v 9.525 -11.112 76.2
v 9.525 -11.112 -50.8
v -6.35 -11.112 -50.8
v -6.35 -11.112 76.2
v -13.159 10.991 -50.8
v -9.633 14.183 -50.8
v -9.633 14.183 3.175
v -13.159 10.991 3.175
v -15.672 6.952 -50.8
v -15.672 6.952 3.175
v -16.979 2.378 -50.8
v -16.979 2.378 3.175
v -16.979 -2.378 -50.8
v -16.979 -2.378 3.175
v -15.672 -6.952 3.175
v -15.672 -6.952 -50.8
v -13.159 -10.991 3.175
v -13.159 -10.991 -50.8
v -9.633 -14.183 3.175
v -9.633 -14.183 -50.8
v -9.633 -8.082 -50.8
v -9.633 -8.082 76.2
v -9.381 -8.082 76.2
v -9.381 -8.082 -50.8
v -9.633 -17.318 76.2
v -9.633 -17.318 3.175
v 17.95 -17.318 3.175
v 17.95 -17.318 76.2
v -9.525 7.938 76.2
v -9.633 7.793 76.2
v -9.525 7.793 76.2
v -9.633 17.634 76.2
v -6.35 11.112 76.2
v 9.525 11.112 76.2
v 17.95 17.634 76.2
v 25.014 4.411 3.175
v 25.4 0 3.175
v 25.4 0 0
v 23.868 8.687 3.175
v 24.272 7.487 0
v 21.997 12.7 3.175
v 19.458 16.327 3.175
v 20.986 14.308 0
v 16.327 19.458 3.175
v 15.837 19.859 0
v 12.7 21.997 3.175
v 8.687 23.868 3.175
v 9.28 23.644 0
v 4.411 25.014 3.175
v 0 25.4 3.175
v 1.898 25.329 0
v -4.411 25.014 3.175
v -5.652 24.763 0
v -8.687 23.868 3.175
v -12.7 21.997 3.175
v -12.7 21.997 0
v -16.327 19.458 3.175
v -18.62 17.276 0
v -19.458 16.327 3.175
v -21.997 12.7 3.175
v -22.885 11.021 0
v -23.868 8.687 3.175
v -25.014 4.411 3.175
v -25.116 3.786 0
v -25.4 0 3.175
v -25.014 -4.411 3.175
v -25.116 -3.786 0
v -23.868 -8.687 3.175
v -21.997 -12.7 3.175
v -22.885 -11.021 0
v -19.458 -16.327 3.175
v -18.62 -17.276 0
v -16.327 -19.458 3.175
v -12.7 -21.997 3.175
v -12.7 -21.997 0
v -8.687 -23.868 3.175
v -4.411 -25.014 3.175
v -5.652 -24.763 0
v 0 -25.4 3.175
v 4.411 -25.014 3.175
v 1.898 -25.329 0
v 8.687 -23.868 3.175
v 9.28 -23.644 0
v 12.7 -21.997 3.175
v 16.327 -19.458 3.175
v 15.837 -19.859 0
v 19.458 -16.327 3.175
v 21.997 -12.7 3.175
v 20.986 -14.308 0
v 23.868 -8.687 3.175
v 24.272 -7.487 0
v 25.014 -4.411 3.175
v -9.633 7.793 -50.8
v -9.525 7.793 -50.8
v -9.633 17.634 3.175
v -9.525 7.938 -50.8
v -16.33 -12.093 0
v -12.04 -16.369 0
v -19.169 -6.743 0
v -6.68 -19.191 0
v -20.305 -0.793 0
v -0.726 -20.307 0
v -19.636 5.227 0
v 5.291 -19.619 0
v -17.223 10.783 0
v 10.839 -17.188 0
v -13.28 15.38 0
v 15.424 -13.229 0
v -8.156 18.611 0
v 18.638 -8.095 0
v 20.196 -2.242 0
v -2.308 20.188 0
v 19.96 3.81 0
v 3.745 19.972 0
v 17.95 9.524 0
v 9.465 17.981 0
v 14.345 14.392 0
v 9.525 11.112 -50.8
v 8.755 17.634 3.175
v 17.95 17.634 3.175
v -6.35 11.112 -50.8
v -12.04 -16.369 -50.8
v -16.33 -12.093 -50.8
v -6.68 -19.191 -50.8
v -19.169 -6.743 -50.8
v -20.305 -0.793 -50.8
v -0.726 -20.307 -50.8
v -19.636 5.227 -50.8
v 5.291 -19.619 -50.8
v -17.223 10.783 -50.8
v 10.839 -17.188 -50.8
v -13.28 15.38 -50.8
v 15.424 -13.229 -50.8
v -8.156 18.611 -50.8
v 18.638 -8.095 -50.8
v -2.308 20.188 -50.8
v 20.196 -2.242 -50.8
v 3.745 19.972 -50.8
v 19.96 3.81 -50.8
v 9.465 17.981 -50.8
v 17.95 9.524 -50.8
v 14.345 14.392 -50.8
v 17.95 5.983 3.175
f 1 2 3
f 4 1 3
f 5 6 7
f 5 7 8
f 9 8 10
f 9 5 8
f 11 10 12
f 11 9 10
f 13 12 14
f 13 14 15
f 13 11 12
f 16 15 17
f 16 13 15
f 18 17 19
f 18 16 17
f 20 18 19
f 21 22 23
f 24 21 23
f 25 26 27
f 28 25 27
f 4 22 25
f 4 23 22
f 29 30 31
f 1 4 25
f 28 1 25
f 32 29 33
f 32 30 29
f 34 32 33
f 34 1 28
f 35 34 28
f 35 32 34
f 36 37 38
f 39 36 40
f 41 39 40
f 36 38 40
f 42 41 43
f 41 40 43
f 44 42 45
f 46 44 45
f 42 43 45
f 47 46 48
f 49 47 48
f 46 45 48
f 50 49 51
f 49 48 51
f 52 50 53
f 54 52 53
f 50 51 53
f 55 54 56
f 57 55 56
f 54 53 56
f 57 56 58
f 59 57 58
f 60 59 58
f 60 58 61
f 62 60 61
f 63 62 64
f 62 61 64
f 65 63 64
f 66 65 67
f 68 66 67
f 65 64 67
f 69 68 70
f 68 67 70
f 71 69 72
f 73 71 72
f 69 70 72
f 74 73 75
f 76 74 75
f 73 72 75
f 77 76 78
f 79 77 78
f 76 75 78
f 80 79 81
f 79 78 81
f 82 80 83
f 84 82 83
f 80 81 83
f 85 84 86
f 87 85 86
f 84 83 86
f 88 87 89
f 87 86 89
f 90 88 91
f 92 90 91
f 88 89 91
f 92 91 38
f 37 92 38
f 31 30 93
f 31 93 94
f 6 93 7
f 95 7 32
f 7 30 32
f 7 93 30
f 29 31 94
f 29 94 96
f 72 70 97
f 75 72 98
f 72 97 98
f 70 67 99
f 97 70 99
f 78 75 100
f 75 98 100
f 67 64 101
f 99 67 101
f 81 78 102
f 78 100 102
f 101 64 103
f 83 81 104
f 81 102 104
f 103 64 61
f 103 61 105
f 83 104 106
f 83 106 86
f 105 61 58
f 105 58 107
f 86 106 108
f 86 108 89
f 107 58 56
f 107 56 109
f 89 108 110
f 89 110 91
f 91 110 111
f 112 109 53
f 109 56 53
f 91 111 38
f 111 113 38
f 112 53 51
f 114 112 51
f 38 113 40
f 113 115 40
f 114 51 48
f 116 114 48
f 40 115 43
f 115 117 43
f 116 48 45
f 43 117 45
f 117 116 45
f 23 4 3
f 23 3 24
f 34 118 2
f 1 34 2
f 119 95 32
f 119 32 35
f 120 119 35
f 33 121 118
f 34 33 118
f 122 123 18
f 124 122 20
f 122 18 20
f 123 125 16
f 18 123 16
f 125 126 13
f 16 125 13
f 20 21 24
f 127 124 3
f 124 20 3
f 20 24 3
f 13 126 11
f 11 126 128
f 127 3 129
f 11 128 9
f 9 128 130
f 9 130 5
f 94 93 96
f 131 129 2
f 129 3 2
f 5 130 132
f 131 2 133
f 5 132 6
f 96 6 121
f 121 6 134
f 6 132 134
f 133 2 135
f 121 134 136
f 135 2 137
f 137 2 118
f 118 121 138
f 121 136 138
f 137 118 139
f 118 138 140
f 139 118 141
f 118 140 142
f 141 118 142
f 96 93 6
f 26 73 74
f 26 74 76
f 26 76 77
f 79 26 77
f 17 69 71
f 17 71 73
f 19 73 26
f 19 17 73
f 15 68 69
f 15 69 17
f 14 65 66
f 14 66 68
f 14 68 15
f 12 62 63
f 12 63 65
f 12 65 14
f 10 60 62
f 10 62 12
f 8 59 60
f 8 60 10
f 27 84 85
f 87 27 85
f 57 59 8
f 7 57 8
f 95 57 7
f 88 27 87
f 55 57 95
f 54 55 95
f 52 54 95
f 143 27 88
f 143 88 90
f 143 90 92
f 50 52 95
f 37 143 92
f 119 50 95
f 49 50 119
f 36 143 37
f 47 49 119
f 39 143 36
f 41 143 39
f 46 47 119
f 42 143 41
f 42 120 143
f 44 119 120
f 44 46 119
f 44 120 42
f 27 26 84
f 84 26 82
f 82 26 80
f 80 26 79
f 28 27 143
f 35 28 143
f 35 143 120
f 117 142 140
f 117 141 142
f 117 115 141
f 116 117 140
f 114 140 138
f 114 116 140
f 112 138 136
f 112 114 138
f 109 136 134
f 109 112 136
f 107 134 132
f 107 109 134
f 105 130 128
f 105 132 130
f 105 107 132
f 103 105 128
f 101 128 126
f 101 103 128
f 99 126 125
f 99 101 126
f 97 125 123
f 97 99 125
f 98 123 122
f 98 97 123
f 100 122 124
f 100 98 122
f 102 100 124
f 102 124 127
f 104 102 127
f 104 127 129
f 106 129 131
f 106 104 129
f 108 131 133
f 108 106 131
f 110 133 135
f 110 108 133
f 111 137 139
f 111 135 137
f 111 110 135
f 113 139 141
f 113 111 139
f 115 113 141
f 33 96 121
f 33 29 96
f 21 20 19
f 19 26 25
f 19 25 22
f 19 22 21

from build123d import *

# Parameters (mm, degrees)
F0_R          = 20.32
F0_R_2        = 17.145
F2_DEPTH      = 50.8
F1_R          = 25.4
F1_R_2        = 17.145
F3_DEPTH      = 3.175
F4_W          = 27.5823939592
F4_H          = 34.9517390132
F5_DEPTH      = 76.2
F5_DEPTH_BACK = 50.8
F6_R          = 34.0814213396
F6_R_2        = 20.32
F7_DEPTH      = 76.2
F8_W          = 9.0154311216
F8_H          = 15.875
F9_DEPTH      = 76.2
F9_DEPTH_BACK = 76.2


with BuildPart() as f2:
    # F0 (on Top) → F2 (new body)
    with BuildSketch(Plane.XY):
        Circle(F0_R)
        Circle(F0_R_2, mode=Mode.SUBTRACT)
    extrude(amount=-F2_DEPTH)

    # F1 (on Top) → F3 (join)
    with BuildSketch(Plane.XY):
        Circle(F1_R)
        Circle(F1_R_2, mode=Mode.SUBTRACT)
    extrude(amount=F3_DEPTH)

    # F4 (on Top) → F5 (join, two sides)
    with BuildSketch(Plane.XY) as f5_sk:
        with Locations((4.1584149003, 0.1579150558)):
            Rectangle(F4_W, F4_H)
        Polygon((9.525, 11.1125), (9.525, -11.1125), (-6.35, -11.1125), (-9.525, -11.1125), (-9.525, -7.9375), (-9.525, 7.9375), (-9.525, 11.1125), (-6.35, 11.1125), align=None, mode=Mode.SUBTRACT)
        Polygon((-9.525, -11.1125), (-6.35, -11.1125), (-9.525, -7.9375), align=None)
        Polygon((-9.525, 7.9375), (-6.35, 11.1125), (-9.525, 11.1125), align=None)
    extrude(amount=F5_DEPTH)
    extrude(f5_sk.sketch, amount=-F5_DEPTH_BACK)

    # F6 (on Top) → F7 (cut)
    with BuildSketch(Plane.XY):
        Circle(F6_R)
        Circle(F6_R_2, mode=Mode.SUBTRACT)
    extrude(amount=-F7_DEPTH, mode=Mode.SUBTRACT)

    # F8 (on Top) → F9 (cut, two sides)
    with BuildSketch(Plane.XY) as f9_sk:
        with Locations((-7.6543868054, -0.1444227528)):
            Rectangle(F8_W, F8_H)
    extrude(amount=-F9_DEPTH, mode=Mode.SUBTRACT)
    extrude(f9_sk.sketch, amount=F9_DEPTH_BACK, mode=Mode.SUBTRACT)


solid = f2.part
